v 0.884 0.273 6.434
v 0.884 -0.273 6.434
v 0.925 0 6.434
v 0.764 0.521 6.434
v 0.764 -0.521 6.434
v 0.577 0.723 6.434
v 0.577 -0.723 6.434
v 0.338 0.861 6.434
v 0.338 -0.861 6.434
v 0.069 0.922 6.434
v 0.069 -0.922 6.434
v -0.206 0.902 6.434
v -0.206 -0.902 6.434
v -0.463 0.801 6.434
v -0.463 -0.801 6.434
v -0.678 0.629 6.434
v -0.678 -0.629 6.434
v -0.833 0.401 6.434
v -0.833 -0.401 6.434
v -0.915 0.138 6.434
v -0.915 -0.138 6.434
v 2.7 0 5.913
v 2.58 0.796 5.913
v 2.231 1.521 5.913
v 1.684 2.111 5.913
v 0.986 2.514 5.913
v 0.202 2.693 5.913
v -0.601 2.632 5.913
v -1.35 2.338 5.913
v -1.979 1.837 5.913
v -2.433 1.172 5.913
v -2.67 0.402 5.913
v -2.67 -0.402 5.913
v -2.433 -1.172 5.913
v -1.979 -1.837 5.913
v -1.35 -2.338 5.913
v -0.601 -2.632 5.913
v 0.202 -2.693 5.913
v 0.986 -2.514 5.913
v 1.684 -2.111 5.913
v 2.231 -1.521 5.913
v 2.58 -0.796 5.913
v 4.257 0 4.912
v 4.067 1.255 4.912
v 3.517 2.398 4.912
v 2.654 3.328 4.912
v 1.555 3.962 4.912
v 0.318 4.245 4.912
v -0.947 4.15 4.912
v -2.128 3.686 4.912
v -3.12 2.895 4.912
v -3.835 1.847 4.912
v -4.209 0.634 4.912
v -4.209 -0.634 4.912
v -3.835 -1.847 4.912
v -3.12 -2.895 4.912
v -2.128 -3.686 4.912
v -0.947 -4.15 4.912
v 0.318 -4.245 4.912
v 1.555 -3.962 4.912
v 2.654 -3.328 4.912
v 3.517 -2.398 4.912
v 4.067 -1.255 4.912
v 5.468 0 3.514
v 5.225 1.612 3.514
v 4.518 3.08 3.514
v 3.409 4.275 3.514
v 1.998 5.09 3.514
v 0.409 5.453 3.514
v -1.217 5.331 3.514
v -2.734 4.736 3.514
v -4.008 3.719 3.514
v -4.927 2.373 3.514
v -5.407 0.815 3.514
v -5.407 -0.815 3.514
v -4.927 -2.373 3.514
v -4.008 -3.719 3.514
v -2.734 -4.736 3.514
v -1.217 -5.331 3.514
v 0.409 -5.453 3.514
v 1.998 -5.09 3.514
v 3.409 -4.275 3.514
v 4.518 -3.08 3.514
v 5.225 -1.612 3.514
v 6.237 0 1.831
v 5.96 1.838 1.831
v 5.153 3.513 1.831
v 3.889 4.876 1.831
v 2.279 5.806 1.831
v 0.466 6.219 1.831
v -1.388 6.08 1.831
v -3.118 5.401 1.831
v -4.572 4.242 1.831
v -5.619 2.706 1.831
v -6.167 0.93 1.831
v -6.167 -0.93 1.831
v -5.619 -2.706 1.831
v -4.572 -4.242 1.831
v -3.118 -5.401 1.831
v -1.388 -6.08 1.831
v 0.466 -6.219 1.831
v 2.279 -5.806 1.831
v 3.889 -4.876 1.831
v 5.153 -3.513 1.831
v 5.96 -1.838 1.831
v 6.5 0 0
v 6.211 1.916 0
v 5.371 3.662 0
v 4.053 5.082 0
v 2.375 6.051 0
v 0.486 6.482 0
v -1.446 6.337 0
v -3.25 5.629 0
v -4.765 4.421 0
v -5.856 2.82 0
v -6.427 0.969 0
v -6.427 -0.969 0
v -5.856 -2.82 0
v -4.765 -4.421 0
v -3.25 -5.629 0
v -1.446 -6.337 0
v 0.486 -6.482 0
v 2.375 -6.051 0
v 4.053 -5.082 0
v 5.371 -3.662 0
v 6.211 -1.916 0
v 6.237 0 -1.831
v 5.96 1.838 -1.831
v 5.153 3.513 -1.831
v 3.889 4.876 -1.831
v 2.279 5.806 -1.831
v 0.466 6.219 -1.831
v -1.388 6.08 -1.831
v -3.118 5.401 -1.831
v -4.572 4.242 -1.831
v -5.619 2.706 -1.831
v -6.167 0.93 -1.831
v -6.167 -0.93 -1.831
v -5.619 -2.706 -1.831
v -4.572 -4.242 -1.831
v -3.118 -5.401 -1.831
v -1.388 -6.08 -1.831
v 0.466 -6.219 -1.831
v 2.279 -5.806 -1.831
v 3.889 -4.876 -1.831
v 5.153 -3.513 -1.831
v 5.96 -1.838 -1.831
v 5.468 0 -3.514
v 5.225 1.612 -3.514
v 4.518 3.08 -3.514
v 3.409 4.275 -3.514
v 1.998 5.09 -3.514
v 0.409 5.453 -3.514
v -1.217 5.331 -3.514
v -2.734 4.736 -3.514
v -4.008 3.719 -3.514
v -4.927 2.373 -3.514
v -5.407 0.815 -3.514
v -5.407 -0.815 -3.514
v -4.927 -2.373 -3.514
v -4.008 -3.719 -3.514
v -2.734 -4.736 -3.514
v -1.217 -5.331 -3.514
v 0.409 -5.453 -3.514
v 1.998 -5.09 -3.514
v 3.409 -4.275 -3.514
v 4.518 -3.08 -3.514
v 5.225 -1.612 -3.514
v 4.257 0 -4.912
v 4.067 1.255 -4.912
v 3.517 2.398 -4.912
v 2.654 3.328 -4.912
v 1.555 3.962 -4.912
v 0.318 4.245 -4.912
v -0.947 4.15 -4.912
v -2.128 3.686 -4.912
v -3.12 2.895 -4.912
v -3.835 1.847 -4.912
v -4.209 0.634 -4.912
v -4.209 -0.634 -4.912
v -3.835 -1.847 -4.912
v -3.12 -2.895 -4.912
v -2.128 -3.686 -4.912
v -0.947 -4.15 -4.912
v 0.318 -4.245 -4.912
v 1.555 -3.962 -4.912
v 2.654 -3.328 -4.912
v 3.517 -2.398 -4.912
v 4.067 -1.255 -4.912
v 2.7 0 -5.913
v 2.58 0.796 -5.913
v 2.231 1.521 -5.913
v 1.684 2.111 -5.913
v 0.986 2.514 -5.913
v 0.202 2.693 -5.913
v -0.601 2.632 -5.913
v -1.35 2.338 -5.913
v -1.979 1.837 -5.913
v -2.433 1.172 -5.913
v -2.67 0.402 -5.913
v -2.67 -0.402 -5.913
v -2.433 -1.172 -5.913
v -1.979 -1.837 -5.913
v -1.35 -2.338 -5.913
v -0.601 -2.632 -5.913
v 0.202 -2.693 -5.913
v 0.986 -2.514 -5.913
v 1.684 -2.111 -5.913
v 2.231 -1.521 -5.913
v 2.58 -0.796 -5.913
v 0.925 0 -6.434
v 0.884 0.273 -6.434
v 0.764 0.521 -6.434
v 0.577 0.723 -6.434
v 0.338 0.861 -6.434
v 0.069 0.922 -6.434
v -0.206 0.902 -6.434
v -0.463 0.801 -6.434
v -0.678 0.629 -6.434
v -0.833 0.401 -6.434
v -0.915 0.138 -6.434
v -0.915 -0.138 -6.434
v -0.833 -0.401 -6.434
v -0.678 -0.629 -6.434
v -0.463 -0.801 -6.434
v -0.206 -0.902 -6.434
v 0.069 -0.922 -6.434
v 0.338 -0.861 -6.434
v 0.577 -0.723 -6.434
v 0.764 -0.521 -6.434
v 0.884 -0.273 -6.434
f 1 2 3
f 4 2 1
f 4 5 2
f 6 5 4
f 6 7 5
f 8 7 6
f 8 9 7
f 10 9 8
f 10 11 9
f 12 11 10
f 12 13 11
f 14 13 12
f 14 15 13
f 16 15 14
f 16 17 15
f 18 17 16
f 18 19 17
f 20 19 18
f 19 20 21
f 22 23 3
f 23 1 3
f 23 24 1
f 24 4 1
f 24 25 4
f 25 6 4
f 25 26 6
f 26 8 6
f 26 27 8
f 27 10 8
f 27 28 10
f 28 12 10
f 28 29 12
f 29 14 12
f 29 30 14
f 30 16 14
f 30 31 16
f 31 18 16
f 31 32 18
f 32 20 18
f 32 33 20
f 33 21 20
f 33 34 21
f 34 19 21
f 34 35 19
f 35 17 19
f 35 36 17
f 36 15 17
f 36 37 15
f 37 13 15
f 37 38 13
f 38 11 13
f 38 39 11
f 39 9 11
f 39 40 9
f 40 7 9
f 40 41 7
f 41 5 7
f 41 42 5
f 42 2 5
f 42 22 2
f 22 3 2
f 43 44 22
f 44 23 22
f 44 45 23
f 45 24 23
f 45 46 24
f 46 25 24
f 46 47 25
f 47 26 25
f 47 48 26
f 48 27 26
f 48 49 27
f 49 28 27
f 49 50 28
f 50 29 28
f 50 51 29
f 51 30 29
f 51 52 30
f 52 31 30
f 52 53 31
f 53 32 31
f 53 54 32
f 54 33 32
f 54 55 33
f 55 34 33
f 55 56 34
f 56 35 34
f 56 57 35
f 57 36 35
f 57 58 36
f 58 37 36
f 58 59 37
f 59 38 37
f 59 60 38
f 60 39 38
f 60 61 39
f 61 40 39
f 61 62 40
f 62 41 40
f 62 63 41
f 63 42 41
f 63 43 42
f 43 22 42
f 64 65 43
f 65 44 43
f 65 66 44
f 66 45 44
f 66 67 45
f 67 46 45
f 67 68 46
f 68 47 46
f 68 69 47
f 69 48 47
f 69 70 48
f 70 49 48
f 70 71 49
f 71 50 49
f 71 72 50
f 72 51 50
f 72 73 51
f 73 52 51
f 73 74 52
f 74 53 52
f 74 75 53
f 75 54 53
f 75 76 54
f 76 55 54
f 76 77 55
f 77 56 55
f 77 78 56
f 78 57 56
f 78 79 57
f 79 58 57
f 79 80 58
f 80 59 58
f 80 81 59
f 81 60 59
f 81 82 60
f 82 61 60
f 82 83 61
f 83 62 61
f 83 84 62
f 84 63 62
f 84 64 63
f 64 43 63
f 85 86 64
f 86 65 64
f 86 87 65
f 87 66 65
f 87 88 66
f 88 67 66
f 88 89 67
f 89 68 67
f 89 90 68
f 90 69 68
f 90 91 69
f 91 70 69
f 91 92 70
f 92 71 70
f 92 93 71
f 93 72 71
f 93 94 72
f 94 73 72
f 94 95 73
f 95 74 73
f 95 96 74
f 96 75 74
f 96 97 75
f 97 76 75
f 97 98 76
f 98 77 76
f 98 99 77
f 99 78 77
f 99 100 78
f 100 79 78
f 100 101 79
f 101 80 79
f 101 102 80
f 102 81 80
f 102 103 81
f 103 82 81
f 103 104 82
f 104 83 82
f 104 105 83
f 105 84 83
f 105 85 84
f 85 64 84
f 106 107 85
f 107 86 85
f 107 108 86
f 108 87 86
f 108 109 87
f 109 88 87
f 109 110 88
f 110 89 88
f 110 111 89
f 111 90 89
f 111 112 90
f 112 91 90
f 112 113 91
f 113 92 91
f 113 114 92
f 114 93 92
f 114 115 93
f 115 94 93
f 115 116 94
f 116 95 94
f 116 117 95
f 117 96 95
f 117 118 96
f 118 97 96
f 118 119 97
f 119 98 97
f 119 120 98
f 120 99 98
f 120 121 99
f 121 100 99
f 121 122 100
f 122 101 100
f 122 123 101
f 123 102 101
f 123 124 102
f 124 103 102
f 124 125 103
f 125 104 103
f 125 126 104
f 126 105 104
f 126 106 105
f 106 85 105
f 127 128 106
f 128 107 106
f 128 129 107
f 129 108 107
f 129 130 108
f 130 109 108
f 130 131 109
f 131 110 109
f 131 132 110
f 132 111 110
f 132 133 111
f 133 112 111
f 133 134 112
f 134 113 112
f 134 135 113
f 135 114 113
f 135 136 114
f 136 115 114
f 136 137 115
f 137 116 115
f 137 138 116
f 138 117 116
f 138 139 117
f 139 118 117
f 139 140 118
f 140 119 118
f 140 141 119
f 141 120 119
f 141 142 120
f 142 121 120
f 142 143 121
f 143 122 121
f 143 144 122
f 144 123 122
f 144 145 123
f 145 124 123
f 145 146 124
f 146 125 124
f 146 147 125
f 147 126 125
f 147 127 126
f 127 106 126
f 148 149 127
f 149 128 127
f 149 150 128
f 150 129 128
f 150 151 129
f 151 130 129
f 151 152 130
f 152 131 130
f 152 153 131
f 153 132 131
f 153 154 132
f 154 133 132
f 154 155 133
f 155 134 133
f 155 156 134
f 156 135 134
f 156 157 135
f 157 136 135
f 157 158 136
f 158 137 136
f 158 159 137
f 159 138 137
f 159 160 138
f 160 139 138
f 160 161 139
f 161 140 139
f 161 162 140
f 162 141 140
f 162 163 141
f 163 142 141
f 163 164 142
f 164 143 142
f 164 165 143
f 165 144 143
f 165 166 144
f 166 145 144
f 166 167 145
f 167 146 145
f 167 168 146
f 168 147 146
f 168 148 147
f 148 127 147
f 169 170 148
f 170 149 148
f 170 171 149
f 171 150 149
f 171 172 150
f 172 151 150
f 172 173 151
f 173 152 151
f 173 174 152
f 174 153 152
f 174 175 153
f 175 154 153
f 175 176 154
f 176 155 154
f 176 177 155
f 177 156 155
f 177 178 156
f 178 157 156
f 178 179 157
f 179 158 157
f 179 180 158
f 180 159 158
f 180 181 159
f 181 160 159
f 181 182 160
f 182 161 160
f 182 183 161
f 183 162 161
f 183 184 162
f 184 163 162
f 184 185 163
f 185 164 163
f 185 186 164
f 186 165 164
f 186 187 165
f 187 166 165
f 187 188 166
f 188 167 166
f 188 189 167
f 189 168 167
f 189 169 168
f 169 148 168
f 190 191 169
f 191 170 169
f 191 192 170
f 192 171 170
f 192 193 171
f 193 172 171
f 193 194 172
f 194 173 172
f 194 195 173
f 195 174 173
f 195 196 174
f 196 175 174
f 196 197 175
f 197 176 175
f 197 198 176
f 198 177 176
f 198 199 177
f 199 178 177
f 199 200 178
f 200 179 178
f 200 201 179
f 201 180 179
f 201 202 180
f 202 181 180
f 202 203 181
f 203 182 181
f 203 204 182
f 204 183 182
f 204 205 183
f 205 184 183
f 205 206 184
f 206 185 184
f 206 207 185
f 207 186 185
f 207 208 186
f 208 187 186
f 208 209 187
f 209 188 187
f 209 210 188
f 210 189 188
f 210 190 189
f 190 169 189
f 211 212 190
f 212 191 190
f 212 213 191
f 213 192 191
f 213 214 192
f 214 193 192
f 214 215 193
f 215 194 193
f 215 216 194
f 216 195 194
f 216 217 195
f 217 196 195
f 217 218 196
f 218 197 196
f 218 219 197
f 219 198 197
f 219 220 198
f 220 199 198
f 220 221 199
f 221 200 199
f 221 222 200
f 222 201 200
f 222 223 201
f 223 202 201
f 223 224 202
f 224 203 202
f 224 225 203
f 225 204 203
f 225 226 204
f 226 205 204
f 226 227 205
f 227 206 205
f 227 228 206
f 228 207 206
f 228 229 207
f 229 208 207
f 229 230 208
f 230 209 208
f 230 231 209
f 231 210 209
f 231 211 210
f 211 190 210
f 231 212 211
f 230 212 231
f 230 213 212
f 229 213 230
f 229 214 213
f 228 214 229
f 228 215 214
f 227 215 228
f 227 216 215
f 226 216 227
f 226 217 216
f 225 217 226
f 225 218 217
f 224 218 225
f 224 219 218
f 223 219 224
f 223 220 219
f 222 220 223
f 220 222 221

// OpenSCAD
// Generated by SolidPython 1.0.1 on 2020-07-29 00:02:42


sphere(d = 13, r = 5);
/***********************************************
*********      SolidPython code:      **********
************************************************
 
# import packages: SolidPython
from solid import *
from solid.utils import *
from itertools import chain, combinations


class Resize:

    def __init__(self, scad_file):
        self.scad_file = scad_file
        #self.scad_file = import_scad(scad_file)
        # cone/cylinder param:
        self.r1 = 0
        self.r2 = 0
        self.h = 0
        # rectangular prism param:
        self.w = 0
        self.l = 0
        # ellipse param:
        self.r = 0

    # import OpenScad code (file name corresponds to shape)


    # classify shape + parameters
    def assign(self, param1, param2, param3):
        if self.scad_file == 'cone.scad':
            self.r1 = param1
            self.r2 = param2
            self.h = param3
        elif self.scad_file == 'cylinder.scad':
            self.r1 = param1
            self.r2 = param2
            self.h = param3
        elif self.scad_file == 'rectangularPrism.scad':
            self.h = param1
            self.l = param2
            self.w = param3
        else:
            self.r = param1
            self.h = param2

    # resize parameters
    def iterate(self):
        x = range(3, 20, 2)
        i = 1
        if self.scad_file == 'cone.scad':
            tempList = list(combinations(x, 3))
            #print(tempList)
            for i in x:
                for j in range (3):
                    param1 = tempList[i][0]
                    param2 = tempList[i][1]
                    param3 = tempList[i][2]
                    filepath = 'produced_scad_files/' + 'cone' + str(param1) + '_' + str(param2) + '_' + str(param3) + '.scad'
                    scad_render_to_file(cylinder(h=param1, r1=param2, r2=param3), filepath)

        elif self.scad_file == 'cylinder.scad':
            tempList = list(combinations(x, 3))
            for i in x:
                for j in range(3):
                    param1 = tempList[i][0]
                    param2 = tempList[i][1]
                    param3 = tempList[i][2]
                    filepath = 'produced_scad_files/' + 'cylinder' + str(param1) + '_' + str(param2) + '_' + str(param3) + '.scad'
                    scad_render_to_file(cylinder(h=param1, r1=param2, r2=param3), filepath)

        elif self.scad_file == 'rectangularPrism.scad':
            tempList = list(combinations(x, 3))
            for i in x:
                for j in range(3):
                    param1 = tempList[i][0]
                    param2 = tempList[i][1]
                    param3 = tempList[i][2]
                    filepath = 'produced_scad_files/' + 'rectangularPrism' + str(param1) + '_' + str(param2) + '_' + str(
                        param3) + '.scad'
                    scad_render_to_file(cube(size=(param1, param2, param3)), filepath)

        else:
            tempList = list(combinations(x, 2))
            for i in x:
                for j in range(3):
                    param1 = tempList[i][0]
                    param2 = tempList[i][1]
                    filepath = 'produced_scad_files/' + 'ellipse' + str(param1) + '_' + str(param2) + '_' + '.scad'
                    scad_render_to_file(sphere(param1, param2), filepath)

    def render_to_scadfile(self):
        scad_render_to_file(scad, 'example.scad') 
 
************************************************/
